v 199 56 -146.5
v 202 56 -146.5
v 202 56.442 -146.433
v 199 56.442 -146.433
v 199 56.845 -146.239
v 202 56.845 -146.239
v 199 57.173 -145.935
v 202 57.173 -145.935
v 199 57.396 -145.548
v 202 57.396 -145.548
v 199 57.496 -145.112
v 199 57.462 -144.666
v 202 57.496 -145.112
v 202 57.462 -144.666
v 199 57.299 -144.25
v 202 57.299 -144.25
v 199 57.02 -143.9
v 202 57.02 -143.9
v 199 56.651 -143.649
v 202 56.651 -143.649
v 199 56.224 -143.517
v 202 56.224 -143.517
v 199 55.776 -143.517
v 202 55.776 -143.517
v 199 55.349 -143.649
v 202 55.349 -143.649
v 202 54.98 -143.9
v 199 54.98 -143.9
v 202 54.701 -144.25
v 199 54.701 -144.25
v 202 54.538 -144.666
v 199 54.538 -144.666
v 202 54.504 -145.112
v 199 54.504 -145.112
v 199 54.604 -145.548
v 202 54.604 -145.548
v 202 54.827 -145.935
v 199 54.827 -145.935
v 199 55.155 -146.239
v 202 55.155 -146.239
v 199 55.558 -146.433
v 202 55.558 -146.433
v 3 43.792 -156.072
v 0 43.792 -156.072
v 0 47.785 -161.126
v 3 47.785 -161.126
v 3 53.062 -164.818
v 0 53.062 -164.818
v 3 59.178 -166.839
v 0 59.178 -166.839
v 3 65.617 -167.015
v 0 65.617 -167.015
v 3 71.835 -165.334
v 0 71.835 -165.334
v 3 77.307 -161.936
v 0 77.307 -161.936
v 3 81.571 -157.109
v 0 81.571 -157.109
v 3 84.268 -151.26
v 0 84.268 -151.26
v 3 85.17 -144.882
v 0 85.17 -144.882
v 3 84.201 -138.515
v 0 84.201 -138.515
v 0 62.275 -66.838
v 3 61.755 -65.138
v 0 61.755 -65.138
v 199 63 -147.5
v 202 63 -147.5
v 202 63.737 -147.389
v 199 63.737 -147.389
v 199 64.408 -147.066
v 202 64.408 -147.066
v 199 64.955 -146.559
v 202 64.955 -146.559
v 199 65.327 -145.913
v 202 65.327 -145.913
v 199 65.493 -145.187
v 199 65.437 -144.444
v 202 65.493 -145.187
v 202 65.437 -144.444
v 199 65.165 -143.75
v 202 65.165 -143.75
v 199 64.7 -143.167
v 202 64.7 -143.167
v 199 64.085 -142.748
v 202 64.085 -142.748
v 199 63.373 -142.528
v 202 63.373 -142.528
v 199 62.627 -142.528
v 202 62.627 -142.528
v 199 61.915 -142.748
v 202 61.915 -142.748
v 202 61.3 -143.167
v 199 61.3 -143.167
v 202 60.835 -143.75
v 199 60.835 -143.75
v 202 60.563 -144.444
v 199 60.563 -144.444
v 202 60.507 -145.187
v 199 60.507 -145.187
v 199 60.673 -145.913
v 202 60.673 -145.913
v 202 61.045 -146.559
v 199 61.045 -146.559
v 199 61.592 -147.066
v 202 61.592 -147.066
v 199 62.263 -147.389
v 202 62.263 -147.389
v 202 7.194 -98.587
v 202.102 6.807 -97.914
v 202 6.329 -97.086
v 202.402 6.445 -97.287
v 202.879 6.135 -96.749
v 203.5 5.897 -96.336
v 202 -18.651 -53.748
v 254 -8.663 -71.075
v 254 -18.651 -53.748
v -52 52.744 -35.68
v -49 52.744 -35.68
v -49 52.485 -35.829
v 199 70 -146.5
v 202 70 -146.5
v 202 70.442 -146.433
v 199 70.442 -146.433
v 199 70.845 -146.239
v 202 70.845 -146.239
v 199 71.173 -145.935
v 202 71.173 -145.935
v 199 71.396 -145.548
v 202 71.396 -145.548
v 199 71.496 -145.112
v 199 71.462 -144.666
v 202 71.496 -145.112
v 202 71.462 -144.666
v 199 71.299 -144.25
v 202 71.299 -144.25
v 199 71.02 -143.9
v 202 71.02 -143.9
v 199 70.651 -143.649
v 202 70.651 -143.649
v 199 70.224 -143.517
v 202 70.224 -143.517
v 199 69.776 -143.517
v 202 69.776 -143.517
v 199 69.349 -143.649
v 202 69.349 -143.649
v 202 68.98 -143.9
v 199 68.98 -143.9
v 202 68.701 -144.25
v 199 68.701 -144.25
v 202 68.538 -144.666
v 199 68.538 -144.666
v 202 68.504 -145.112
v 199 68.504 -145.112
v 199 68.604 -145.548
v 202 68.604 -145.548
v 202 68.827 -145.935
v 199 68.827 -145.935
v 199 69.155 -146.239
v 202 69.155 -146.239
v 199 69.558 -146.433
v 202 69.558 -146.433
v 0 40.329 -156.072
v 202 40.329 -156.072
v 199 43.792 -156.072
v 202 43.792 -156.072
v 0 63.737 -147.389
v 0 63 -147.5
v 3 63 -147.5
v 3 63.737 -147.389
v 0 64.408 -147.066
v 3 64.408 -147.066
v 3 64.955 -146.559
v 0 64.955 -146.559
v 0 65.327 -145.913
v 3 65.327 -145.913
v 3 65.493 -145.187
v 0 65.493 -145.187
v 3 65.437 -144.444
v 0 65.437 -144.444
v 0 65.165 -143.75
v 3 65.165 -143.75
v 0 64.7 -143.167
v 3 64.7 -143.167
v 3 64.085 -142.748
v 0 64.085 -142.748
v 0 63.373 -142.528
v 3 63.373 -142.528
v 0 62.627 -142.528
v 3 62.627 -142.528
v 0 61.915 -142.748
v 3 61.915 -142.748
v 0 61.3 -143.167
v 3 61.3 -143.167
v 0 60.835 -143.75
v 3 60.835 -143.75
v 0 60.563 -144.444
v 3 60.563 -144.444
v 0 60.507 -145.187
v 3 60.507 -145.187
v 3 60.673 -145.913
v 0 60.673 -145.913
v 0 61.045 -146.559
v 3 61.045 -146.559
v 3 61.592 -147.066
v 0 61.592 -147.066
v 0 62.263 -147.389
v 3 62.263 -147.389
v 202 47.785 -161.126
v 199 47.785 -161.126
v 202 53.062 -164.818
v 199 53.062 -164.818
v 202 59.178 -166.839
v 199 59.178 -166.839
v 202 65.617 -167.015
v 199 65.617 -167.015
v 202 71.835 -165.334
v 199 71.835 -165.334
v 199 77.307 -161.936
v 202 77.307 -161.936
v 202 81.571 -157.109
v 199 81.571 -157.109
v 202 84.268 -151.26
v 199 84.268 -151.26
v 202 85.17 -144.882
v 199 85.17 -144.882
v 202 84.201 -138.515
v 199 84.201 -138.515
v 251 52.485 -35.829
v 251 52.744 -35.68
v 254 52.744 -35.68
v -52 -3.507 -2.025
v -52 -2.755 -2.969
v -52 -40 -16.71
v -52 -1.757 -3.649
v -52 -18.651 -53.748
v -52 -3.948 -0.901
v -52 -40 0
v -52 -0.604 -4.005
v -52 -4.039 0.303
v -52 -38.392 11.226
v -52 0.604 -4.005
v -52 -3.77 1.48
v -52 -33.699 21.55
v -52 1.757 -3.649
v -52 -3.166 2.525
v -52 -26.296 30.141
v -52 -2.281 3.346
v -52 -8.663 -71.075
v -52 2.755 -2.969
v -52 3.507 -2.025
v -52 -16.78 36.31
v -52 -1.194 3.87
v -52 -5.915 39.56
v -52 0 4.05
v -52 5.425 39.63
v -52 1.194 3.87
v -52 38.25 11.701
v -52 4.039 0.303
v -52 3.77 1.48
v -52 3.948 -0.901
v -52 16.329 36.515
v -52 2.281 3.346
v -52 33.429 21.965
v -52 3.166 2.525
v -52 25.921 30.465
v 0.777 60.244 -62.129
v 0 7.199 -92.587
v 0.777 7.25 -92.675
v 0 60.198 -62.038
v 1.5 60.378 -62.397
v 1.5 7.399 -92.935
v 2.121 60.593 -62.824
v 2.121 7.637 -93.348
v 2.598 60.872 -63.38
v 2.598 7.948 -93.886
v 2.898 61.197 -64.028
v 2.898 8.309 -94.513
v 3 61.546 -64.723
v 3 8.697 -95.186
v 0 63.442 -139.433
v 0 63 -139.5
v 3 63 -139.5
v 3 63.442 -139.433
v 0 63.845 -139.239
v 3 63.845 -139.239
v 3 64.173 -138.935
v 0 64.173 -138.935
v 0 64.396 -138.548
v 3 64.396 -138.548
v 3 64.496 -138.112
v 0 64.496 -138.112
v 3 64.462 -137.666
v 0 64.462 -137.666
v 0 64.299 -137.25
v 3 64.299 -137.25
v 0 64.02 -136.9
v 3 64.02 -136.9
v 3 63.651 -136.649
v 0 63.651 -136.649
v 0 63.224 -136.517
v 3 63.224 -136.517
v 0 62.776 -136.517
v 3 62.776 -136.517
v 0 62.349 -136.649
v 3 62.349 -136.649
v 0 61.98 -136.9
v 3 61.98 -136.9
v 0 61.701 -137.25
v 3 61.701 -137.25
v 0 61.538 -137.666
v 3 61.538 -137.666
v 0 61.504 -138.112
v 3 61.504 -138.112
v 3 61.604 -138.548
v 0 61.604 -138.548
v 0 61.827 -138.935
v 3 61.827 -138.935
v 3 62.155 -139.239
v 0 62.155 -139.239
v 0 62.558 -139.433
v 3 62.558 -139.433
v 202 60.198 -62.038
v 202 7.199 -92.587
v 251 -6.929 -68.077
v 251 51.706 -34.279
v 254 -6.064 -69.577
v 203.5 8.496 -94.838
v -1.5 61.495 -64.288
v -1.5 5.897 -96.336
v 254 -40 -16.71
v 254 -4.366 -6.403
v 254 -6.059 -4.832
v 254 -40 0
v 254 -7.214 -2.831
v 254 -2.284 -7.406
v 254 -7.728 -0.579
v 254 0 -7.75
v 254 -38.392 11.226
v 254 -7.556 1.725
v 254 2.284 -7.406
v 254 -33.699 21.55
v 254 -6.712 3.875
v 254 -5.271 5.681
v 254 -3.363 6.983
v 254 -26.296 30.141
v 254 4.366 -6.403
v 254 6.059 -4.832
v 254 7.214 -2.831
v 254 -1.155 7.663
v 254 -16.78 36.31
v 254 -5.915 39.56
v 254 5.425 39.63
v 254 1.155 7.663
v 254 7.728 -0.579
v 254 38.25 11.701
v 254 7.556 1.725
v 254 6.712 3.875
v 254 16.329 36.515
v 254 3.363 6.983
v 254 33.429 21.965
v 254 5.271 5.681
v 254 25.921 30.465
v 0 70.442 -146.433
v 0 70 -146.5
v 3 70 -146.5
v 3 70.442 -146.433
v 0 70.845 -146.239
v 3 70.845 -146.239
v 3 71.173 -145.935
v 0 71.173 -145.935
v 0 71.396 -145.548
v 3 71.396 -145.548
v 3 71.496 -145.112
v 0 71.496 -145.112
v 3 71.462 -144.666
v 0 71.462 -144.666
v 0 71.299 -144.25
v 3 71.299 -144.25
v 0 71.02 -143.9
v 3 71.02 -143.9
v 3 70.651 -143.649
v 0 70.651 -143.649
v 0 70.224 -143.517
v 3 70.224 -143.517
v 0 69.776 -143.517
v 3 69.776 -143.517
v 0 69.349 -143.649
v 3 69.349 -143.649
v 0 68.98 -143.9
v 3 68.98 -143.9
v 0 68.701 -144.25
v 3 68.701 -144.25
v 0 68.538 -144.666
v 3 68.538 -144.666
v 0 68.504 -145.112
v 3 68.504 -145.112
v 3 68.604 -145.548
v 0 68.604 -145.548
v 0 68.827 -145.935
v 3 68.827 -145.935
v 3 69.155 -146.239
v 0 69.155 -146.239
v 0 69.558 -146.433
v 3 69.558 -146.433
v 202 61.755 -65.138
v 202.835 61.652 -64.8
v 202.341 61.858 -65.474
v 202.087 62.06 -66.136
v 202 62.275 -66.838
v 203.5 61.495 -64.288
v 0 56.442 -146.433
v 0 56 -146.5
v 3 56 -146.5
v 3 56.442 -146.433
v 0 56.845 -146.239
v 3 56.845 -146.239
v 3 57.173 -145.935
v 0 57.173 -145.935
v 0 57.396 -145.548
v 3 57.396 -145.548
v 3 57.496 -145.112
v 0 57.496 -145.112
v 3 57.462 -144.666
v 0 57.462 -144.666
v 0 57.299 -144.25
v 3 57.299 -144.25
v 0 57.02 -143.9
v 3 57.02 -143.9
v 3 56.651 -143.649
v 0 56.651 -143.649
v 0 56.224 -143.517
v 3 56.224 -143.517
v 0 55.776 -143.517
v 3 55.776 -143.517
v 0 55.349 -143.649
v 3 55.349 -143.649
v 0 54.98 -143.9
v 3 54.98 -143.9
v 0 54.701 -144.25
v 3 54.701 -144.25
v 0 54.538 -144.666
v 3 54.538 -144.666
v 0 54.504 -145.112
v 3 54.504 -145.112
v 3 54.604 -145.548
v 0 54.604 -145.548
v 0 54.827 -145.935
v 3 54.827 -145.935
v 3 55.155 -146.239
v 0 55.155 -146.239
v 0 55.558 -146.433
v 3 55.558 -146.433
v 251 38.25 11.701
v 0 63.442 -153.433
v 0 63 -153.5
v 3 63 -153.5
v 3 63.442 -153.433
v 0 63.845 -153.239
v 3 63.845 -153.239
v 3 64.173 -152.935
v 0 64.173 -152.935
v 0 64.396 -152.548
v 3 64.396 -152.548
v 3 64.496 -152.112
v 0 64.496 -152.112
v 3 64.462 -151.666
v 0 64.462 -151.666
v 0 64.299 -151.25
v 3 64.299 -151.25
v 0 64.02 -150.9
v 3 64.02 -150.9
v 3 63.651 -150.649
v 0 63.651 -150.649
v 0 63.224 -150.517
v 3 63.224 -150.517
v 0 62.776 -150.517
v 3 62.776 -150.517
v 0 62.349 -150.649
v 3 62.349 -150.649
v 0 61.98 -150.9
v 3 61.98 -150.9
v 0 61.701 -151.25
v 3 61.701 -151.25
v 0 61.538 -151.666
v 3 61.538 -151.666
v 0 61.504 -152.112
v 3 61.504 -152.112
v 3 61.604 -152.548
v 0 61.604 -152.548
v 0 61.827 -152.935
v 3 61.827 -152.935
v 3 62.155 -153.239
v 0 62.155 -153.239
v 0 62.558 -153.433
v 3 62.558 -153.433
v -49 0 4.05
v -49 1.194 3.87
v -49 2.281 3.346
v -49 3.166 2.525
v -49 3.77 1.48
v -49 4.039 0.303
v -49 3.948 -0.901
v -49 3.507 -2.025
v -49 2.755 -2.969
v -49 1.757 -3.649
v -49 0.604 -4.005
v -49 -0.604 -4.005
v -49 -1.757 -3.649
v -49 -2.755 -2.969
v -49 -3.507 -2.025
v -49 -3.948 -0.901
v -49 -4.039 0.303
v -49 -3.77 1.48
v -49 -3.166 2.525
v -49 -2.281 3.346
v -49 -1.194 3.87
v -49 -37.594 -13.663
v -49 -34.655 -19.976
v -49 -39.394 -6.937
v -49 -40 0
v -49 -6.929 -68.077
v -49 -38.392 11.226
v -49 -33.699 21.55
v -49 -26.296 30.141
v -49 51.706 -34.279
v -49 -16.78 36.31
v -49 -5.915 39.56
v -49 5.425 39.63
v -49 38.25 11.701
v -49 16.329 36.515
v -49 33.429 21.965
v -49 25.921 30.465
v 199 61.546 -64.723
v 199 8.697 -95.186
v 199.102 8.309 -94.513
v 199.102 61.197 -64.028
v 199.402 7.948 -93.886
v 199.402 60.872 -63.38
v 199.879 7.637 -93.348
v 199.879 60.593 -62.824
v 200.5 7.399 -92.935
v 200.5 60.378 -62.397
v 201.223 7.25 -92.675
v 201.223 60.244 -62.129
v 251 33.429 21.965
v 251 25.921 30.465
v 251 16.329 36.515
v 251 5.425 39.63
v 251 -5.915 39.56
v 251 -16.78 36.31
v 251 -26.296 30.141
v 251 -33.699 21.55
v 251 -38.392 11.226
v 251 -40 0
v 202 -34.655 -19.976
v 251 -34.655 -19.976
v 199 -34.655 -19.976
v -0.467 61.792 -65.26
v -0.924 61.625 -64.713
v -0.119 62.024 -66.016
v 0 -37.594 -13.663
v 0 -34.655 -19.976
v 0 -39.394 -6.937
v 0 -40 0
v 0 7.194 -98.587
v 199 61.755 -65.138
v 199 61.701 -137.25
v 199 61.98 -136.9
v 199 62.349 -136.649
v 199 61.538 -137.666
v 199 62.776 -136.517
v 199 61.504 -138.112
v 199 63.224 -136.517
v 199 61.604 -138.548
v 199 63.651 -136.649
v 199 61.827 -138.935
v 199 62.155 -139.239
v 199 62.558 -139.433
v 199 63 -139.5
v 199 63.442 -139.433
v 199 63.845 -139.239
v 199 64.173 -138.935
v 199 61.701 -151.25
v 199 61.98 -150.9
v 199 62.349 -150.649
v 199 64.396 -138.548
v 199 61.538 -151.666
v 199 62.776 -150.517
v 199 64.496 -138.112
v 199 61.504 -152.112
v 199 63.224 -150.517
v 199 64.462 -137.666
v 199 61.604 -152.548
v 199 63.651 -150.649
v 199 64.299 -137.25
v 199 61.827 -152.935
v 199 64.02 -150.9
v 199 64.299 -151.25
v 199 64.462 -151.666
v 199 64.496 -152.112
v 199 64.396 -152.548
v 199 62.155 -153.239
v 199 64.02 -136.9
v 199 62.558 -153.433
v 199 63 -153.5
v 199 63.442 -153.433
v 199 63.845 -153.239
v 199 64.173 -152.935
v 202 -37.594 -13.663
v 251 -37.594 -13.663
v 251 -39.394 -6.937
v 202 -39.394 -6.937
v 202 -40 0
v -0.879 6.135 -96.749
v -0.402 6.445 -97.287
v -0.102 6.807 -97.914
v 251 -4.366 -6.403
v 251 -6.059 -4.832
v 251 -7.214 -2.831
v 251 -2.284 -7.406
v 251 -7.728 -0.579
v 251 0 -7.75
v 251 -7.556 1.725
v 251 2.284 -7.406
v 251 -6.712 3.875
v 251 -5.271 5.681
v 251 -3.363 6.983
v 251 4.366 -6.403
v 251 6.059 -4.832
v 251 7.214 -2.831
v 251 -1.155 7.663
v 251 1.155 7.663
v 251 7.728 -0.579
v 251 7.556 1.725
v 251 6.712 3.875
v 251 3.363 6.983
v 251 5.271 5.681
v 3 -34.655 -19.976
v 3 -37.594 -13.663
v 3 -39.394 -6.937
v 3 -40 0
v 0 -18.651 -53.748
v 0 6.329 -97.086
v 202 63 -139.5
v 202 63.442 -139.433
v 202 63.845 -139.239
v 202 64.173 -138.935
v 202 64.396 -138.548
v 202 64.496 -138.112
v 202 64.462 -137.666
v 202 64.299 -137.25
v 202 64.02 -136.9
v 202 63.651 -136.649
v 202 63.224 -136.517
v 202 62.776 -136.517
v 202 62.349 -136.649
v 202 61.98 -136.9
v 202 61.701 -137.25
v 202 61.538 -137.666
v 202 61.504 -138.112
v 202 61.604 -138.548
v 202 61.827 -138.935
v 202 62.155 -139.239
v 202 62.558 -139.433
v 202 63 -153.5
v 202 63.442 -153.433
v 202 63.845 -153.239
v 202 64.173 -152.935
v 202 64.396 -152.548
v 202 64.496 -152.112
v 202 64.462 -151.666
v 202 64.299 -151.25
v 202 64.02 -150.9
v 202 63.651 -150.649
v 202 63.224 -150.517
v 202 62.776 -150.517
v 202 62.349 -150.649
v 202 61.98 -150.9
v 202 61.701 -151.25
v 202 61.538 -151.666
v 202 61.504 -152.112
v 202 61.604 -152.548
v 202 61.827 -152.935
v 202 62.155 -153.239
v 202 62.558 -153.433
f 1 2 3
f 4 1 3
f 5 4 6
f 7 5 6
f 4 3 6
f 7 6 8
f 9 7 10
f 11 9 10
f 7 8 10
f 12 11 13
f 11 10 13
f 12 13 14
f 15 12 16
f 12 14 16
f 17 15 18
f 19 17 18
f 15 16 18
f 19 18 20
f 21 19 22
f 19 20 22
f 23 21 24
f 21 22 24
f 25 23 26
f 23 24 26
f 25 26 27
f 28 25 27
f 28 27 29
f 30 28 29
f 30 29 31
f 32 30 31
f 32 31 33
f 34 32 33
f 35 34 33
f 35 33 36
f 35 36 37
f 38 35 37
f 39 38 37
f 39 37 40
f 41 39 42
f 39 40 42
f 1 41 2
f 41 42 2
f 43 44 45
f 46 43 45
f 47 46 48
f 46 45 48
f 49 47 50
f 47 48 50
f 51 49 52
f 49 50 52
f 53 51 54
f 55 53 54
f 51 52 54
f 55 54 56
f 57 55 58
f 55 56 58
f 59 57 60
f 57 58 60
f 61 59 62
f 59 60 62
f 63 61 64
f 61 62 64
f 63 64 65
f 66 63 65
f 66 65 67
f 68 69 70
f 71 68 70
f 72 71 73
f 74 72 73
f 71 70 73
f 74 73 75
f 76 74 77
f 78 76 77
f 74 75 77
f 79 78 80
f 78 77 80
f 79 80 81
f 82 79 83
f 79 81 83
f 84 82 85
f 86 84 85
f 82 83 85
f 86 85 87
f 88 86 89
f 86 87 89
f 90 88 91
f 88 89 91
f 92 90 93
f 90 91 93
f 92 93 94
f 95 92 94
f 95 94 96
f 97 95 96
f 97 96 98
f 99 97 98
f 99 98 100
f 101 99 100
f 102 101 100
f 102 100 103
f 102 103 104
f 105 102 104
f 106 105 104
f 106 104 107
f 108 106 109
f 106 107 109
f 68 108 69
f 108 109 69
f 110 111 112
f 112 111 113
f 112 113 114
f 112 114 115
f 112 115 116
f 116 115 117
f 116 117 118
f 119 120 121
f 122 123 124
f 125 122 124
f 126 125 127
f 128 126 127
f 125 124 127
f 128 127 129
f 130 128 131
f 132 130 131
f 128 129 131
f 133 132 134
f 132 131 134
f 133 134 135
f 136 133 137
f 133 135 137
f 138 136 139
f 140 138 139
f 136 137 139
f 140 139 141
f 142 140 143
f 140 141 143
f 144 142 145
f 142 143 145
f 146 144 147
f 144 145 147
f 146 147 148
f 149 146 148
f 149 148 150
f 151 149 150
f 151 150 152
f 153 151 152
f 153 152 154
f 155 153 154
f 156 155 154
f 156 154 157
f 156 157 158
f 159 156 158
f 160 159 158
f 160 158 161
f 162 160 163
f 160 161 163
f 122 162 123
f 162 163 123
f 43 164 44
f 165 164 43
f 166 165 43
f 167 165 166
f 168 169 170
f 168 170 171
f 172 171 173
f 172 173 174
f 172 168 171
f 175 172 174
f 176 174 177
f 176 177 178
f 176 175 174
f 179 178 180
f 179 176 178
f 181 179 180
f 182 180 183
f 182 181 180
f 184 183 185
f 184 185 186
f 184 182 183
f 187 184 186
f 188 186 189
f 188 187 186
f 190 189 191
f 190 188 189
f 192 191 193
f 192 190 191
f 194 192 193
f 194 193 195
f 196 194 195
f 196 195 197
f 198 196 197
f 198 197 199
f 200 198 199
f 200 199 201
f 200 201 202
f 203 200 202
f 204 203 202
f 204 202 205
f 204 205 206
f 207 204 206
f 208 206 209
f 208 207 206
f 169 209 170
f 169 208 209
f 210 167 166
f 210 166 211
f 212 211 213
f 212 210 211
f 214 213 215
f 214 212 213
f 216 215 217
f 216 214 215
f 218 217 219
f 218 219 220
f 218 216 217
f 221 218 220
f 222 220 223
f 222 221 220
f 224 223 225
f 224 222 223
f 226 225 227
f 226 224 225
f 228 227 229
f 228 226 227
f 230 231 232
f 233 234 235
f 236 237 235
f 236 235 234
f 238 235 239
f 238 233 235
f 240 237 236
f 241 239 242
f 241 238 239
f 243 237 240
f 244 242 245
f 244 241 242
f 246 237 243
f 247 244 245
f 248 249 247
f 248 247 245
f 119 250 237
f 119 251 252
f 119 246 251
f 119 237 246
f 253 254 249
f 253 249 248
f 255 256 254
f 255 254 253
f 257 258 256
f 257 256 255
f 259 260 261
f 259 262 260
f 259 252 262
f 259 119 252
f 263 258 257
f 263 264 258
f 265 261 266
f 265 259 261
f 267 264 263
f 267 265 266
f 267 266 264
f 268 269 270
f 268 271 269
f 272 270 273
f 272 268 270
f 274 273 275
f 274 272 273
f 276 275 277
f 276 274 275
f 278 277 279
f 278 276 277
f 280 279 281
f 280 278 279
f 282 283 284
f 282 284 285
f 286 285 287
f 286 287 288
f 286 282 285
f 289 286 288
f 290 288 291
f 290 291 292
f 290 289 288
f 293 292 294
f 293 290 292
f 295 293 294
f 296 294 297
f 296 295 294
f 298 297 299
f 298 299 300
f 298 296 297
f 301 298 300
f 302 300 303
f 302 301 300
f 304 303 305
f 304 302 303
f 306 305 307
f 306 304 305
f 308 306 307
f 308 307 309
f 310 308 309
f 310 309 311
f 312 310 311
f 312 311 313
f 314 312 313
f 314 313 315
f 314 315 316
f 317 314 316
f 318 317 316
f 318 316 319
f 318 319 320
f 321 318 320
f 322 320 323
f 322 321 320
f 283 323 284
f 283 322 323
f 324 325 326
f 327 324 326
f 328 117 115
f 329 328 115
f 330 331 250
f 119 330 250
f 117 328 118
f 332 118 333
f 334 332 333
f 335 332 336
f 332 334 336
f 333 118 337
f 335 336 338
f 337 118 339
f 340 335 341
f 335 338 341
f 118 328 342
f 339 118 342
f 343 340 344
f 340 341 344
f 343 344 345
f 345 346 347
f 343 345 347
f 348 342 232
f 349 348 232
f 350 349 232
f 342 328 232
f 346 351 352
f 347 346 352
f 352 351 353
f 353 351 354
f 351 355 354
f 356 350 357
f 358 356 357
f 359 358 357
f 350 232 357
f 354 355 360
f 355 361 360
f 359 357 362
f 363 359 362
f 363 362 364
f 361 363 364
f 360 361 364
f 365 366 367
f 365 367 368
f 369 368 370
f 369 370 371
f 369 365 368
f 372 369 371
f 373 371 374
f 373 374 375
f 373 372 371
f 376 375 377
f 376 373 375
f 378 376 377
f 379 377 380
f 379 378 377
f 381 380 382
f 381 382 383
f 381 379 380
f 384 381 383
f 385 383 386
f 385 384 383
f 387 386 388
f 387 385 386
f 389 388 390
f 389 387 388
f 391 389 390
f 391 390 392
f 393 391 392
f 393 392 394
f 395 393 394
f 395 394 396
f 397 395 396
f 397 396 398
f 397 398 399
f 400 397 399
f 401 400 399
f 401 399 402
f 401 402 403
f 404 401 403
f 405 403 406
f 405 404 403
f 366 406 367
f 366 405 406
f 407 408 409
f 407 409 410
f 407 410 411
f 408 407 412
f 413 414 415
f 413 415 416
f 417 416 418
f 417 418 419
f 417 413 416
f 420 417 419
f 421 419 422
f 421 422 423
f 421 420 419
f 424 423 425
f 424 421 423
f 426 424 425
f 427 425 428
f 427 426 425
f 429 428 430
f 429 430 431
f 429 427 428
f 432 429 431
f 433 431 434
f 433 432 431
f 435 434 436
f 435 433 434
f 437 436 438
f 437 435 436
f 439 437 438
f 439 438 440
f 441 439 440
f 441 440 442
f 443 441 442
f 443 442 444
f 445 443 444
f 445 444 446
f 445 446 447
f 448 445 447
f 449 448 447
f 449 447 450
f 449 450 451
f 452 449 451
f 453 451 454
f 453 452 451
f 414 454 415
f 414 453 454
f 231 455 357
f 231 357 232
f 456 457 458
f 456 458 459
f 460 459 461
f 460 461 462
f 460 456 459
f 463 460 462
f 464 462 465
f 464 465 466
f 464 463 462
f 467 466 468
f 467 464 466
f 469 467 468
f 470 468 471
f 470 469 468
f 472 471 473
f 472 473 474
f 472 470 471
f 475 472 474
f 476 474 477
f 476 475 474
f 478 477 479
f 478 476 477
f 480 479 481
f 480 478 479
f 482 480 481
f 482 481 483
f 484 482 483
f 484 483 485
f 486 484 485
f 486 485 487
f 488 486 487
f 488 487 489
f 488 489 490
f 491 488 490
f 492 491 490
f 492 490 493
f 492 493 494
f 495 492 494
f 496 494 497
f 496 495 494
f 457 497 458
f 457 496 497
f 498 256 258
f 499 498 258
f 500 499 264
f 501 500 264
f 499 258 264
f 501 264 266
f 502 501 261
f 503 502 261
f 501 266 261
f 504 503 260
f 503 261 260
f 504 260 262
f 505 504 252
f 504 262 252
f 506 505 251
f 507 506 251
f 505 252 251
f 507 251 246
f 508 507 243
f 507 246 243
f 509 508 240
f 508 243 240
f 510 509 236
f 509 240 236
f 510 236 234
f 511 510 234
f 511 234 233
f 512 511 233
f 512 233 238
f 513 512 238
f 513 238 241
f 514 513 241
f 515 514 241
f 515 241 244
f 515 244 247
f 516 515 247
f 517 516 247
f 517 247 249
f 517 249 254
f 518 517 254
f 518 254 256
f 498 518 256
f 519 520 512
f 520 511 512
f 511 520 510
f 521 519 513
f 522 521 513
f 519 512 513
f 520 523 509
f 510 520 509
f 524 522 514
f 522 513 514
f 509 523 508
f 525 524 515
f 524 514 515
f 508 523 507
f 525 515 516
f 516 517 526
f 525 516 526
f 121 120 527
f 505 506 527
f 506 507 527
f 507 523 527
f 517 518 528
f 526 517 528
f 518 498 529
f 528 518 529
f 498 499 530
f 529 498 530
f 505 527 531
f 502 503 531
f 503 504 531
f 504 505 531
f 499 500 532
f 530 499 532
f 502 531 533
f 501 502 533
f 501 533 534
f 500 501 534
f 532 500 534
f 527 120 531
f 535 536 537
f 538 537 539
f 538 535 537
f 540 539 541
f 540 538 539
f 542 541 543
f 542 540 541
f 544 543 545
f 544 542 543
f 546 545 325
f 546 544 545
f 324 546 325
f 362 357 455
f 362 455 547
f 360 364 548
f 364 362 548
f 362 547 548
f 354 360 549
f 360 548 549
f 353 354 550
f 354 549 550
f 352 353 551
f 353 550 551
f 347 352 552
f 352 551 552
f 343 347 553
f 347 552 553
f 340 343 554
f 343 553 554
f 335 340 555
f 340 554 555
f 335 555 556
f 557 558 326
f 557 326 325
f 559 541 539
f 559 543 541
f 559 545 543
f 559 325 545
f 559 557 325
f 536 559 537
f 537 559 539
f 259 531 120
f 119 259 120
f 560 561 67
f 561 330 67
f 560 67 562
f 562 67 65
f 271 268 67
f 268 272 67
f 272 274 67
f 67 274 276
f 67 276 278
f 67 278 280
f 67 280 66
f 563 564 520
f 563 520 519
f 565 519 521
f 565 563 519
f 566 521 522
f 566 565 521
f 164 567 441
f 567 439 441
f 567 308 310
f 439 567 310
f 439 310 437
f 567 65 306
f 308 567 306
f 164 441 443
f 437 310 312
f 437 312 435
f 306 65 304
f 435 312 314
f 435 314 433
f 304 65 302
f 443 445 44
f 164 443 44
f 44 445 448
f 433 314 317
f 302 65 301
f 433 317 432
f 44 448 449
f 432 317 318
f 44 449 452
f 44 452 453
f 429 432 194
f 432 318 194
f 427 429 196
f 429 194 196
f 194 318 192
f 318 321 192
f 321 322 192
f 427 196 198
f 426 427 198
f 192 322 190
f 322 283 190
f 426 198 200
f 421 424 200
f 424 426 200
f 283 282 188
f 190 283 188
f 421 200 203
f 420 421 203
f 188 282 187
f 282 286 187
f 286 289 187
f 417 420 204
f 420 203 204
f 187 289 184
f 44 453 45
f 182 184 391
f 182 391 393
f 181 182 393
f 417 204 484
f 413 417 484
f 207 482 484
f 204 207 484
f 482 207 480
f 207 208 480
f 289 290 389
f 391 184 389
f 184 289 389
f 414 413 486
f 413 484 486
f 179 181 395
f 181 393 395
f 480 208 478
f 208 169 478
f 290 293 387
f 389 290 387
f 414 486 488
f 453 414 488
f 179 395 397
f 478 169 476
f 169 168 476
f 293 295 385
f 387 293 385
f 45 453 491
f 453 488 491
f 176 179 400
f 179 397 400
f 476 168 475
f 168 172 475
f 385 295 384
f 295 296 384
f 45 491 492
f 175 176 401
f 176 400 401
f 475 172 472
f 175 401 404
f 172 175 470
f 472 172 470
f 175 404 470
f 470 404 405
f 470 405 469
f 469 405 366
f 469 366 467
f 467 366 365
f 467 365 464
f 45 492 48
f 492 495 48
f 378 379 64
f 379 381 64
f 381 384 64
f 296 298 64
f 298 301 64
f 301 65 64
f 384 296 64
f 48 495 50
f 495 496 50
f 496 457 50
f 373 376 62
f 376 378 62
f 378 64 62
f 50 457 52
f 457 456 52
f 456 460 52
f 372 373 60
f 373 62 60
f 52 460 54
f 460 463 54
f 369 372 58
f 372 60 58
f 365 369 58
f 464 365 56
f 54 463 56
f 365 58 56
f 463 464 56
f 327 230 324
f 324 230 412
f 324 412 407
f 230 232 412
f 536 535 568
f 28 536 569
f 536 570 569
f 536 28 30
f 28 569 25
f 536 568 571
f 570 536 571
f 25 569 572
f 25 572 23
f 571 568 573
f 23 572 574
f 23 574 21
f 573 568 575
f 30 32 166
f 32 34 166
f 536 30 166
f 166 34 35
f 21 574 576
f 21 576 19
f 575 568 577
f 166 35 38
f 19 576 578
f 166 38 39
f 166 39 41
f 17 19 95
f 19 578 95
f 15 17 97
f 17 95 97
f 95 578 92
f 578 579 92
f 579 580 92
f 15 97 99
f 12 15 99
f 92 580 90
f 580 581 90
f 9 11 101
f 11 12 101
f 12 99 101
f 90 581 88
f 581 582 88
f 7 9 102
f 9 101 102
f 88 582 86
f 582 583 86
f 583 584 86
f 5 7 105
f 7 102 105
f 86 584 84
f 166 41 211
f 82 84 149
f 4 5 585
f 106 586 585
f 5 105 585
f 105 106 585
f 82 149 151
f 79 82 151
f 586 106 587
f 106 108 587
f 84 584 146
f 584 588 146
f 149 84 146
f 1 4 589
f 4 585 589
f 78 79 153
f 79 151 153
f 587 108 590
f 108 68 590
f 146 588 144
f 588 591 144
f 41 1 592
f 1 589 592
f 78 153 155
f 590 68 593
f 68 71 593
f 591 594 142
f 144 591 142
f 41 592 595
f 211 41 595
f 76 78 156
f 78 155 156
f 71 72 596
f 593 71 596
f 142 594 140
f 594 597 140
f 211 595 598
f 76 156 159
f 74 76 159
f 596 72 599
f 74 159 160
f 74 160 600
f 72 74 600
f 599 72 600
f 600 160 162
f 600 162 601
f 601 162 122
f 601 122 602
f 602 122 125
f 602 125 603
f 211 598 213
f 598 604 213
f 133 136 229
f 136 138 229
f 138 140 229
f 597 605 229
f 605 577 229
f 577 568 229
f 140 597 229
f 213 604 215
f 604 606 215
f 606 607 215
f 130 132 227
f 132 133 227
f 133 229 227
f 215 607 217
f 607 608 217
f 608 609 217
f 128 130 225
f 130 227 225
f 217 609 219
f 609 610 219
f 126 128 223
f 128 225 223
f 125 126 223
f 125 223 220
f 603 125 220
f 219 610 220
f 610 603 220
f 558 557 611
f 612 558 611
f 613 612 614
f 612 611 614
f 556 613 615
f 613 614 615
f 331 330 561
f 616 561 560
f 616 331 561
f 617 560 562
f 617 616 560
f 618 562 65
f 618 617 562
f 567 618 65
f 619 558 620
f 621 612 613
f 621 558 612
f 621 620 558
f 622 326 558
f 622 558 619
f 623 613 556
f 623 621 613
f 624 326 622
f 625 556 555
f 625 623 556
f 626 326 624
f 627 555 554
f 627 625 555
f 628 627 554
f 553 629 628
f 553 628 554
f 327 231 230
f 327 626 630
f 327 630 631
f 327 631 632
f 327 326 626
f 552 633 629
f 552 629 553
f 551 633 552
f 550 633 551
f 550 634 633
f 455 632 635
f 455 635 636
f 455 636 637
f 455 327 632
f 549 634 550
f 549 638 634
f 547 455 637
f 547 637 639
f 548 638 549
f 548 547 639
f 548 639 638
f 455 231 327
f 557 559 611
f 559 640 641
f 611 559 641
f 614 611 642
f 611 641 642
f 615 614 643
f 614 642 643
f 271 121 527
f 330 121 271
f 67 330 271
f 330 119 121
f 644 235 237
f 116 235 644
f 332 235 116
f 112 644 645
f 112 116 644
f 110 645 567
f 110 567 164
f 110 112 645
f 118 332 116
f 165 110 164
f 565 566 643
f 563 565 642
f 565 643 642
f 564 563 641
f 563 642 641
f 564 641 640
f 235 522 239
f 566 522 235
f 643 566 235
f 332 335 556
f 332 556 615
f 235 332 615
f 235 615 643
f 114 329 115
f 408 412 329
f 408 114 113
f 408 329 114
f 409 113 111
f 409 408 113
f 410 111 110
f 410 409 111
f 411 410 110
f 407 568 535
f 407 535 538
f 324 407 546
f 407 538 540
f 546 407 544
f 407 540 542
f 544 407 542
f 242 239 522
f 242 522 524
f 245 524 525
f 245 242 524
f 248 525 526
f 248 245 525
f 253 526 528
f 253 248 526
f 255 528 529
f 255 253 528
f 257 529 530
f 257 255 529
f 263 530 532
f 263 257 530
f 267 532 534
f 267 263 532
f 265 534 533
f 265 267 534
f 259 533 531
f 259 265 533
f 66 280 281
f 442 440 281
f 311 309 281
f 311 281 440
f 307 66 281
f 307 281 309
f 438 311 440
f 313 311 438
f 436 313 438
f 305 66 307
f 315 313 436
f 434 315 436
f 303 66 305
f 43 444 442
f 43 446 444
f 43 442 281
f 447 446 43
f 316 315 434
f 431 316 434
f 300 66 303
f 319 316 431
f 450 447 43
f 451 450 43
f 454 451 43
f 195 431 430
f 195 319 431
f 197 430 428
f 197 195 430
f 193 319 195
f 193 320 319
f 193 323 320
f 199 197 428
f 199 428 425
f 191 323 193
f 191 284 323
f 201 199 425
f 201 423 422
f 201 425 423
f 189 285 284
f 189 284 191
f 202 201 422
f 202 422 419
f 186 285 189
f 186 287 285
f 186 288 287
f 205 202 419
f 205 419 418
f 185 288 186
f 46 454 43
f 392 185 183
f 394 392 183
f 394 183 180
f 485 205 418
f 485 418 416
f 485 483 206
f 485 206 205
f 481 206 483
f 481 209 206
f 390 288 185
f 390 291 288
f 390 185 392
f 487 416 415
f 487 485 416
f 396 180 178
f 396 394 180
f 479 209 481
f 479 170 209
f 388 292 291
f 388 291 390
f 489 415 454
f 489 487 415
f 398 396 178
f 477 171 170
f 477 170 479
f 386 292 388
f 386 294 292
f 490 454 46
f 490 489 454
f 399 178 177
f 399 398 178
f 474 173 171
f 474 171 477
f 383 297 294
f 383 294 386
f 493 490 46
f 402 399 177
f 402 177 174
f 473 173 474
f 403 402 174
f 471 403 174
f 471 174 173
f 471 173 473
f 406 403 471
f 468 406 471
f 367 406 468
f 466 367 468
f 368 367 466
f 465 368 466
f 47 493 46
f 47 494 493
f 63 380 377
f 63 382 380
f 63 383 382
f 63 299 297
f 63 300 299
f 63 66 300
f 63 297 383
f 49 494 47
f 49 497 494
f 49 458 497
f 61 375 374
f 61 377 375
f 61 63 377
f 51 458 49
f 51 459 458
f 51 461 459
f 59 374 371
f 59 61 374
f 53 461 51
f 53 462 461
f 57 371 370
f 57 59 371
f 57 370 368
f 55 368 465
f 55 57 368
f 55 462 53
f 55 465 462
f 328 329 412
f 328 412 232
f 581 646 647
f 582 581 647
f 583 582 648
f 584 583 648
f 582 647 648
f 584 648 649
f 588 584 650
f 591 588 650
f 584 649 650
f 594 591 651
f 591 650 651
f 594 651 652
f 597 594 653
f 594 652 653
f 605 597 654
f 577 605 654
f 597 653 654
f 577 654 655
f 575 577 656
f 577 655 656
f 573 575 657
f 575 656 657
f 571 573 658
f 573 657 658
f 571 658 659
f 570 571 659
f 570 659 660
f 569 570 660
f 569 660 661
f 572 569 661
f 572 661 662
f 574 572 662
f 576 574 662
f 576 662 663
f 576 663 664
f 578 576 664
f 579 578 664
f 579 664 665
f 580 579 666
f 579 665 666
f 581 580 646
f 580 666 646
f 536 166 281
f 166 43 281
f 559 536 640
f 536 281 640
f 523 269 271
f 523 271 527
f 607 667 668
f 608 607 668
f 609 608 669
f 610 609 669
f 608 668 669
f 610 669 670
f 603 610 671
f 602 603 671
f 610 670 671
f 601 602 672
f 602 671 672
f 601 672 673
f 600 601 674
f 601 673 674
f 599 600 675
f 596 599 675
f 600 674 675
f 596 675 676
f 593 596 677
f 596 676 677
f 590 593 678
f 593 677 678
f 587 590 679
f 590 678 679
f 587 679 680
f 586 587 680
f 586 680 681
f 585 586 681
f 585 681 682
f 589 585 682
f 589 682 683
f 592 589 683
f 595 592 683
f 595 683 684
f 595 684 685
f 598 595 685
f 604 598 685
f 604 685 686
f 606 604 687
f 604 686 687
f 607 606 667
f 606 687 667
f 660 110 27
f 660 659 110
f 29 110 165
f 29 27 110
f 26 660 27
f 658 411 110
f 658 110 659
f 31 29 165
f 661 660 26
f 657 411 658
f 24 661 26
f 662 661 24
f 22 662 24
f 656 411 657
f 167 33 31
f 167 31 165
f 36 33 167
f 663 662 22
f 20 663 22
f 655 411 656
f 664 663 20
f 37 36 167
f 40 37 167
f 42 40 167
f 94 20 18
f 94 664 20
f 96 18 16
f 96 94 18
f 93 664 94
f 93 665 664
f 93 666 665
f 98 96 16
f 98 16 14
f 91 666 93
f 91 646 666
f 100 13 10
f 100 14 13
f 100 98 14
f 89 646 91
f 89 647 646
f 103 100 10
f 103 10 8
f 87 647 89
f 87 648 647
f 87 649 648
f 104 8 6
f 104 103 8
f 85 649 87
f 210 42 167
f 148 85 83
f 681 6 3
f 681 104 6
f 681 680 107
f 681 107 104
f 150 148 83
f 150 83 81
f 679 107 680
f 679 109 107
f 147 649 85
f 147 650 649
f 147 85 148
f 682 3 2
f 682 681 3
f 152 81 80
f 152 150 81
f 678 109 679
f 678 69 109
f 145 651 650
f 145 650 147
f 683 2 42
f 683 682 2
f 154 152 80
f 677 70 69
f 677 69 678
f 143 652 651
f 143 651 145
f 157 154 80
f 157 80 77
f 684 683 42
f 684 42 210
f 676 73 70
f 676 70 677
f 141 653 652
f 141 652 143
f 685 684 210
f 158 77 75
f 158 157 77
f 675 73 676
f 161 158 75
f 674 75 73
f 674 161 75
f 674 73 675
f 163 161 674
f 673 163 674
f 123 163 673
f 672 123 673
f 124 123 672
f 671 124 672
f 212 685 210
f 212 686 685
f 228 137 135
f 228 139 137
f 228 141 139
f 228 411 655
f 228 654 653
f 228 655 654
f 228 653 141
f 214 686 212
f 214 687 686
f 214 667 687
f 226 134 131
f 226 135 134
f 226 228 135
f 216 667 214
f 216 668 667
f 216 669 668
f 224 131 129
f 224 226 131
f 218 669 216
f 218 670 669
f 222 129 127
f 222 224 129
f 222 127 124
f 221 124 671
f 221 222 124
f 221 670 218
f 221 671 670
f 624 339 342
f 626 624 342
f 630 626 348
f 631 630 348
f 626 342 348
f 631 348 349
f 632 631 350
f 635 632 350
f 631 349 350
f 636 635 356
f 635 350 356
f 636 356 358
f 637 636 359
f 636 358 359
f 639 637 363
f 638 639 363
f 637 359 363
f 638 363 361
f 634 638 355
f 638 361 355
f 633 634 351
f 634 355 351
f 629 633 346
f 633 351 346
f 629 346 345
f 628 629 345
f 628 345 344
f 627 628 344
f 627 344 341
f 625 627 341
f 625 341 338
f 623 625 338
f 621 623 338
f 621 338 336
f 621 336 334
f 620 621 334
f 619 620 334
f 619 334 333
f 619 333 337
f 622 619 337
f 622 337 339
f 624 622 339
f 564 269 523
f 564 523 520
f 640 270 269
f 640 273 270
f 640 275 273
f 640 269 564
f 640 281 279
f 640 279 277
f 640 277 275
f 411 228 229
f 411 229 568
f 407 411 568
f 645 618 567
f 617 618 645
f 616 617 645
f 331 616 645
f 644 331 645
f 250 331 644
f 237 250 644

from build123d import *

# Parameters (mm, degrees)
SKETCH_2_R          = 3
SKETCH_2_R_2        = 1.5
SKETCH_2_R_3        = 2.5
EXTRUDE_1_DEPTH     = 3
EXTRUDE_2_DEPTH     = 196
SKETCH_5_R          = 8
CUT_EXTRUDE_1_DEPTH = 10
SKETCH_6_R          = 4.05
CUT_EXTRUDE_2_DEPTH = 10
SKETCH_8_R          = 40
EXTRUDE_3_DEPTH     = 3
EXTRUDE_START       = -61
EXTRUDE_4_DEPTH     = 64
EXTRUDE_5_DEPTH     = 3
EXTRUDE_START_2     = -3
EXTRUDE_14_DEPTH    = 3
EXTRUDE_15_DEPTH    = 3
SKETCH_16_R         = 40
EXTRUDE_16_DEPTH    = 3
CUT_EXTRUDE_START   = -20
CUT_EXTRUDE_5_DEPTH = 20
CUT_EXTRUDE_6_DEPTH = 20
CUT_EXTRUDE_7_DEPTH = 3
FILLET_3_R          = 3
FILLET_4_R          = 3
FILLET_5_R          = 3
FILLET_6_R          = 3
SKETCH_22_R         = 7.75
CUT_EXTRUDE_8_DEPTH = 10
SKETCH_23_R         = 4.05
CUT_EXTRUDE_9_DEPTH = 10


# Some blends are built 0.0001 mm under size
with BuildPart() as part:
    # 草图2 → 凸台-拉伸1 (new body)
    with BuildSketch(Plane(origin=(0, 0, 0), x_dir=(0, 0, -1), z_dir=(1, 0, 0))):
        with BuildLine():
            Line((138.514809283, 84.200667909), (-11.70063651, 38.25042621))
            ThreePointArc((-11.70063651, 38.25042621), (-39.560188627, -5.915359313), (0, -40))
            Line((0, -40), (16.710190716, -40))
            Line((16.710190716, -40), (156.071648789, 40.329376559))
            Line((156.071648789, 40.329376559), (156.071648789, 43.792069046))
            ThreePointArc((156.071648789, 43.792069046), (165.334026038, 71.834783727), (138.514809283, 84.200667909))
        make_face()
        Circle(SKETCH_2_R, mode=Mode.SUBTRACT)
        with Locations((145, 70)):
            Circle(SKETCH_2_R_2, mode=Mode.SUBTRACT)
        with Locations((138, 63)):
            Circle(SKETCH_2_R_2, mode=Mode.SUBTRACT)
        with Locations((145, 56)):
            Circle(SKETCH_2_R_2, mode=Mode.SUBTRACT)
        with Locations((145, 63)):
            Circle(SKETCH_2_R_3, mode=Mode.SUBTRACT)
        with Locations((152, 63)):
            Circle(SKETCH_2_R_2, mode=Mode.SUBTRACT)
    extrude_1 = extrude(amount=EXTRUDE_1_DEPTH)

    # 草图4 → 凸台-拉伸2 (add)
    with BuildSketch(Plane(origin=(3, 0, 0), x_dir=(0, 0, -1), z_dir=(1, 0, 0))):
        with BuildLine():
            Line((0, -40), (16.710190716, -40))
            Line((16.710190716, -40), (156.071648789, 40.329376559))
            Line((156.071648789, 40.329376559), (156.071648789, 43.792069046))
            Line((156.071648789, 43.792069046), (19.975563357, -34.655113166))
            ThreePointArc((19.975563357, -34.655113166), (10.339136167, -38.640681455), (0, -40))
        make_face()
    extrude(amount=EXTRUDE_2_DEPTH)

    # 镜向2: 凸台-拉伸1 across plane
    add(extrude_1.mirror(Plane(origin=(101, 0, 0), x_dir=(0, 0, 1), z_dir=(1, 0, 0))))

    # 草图5 → 切除-拉伸1 (cut)
    with BuildSketch(Plane(origin=(202, 0, 0), x_dir=(0, 0, -1), z_dir=(1, 0, 0))):
        Circle(SKETCH_5_R)
    extrude(amount=-CUT_EXTRUDE_1_DEPTH, mode=Mode.SUBTRACT)

    # 草图6 → 切除-拉伸2 (cut)
    with BuildSketch(Plane.ZY):
        Circle(SKETCH_6_R)
    extrude(amount=-CUT_EXTRUDE_2_DEPTH, mode=Mode.SUBTRACT)

    # 草图9 → 凸台-拉伸4 (add)
    with BuildSketch(Plane(origin=(251, 0, 0), x_dir=(0, 0, -1), z_dir=(1, 0, 0)).offset(EXTRUDE_START)):
        with BuildLine():
            Line((0, -40), (16.710190716, -40))
            Line((16.710190716, -40), (53.747942483, -18.651059269))
            Line((53.747942483, -18.651059269), (52.249775231, -16.051925781))
            Line((52.249775231, -16.051925781), (19.975563357, -34.655113166))
            ThreePointArc((19.975563357, -34.655113166), (10.339136167, -38.640681455), (0, -40))
        make_face()
    extrude_4 = extrude(amount=EXTRUDE_4_DEPTH)

    # 草图10 → 凸台-拉伸5 (add)
    with BuildSketch(Plane(origin=(0, -37.254246654, -21.473730609), x_dir=(1, 0, 0), z_dir=(0, -0.8663778291595938, -0.49938908392225567))):
        Polygon((254, -37.251890328), (254, -57.251890328), (202, -87.274104325), (202, -37.251890328), align=None)
    extrude_5 = extrude(amount=-EXTRUDE_5_DEPTH)



with BuildPart() as body_2:
    # 草图8 → 凸台-拉伸3 (new body)
    with BuildSketch(Plane(origin=(251, 0, 0), x_dir=(0, 0, -1), z_dir=(1, 0, 0))):
        Circle(SKETCH_8_R)
    extrude(amount=EXTRUDE_3_DEPTH)


with BuildPart() as part_1:
    add(part.part)

    add(body_2.part)  # 凸台-拉伸14 merges body 2
    # 草图14 → 凸台-拉伸14 (add)
    with BuildSketch(Plane(origin=(254, 0, 0), x_dir=(0, 0, -1), z_dir=(1, 0, 0)).offset(EXTRUDE_START_2)):
        with BuildLine():
            Line((-11.70063651, 38.25042621), (35.679778873, 52.743886101))
            Line((35.679778873, 52.743886101), (69.577331814, -6.064144103))
            Line((69.577331814, -6.064144103), (19.975563357, -34.655113166))
            ThreePointArc((19.975563357, -34.655113166), (36.686823541, 15.939792297), (-11.70063651, 38.25042621))
        make_face()
    extrude_14 = extrude(amount=EXTRUDE_14_DEPTH)

    # 草图15 → 凸台-拉伸15 (add)
    with BuildSketch(Plane(origin=(88.290795719, 76.368648195, -132.490087928), x_dir=(-0.8660254037844362, 0.24969454196113003, -0.4331889145798008), z_dir=(0.5000000000000044, 0.4324836330493111, -0.7503052093278204))):
        Polygon((-191.344507397, -43), (-191.344507397, 27.878041456), (-131.300079402, 20.97393325), (-131.300079402, -43), align=None)
    extrude_15 = extrude(amount=-EXTRUDE_15_DEPTH)

    # 镜向8: 凸台-拉伸15 across plane
    add(extrude_15.mirror(Plane(origin=(101, 0, 0), x_dir=(0, 0, 1), z_dir=(1, 0, 0))))

    # 镜向10: 凸台-拉伸5 across plane
    add(extrude_5.mirror(Plane(origin=(101, 0, 0), x_dir=(0, 0, 1), z_dir=(1, 0, 0))))

    # 镜向11: 凸台-拉伸4 across plane
    add(extrude_4.mirror(Plane(origin=(101, 0, 0), x_dir=(0, 0, 1), z_dir=(1, 0, 0))))

    # 镜向12: 凸台-拉伸14 across plane
    add(extrude_14.mirror(Plane(origin=(101, 0, 0), x_dir=(0, 0, 1), z_dir=(1, 0, 0))))

    # 草图16 → 凸台-拉伸16 (add)
    with BuildSketch(Plane.ZY.offset(52)):
        Circle(SKETCH_16_R)
    extrude(amount=-EXTRUDE_16_DEPTH)

    # 草图17 → 切除-拉伸5 (cut)
    with BuildSketch(Plane(origin=(202, 0, 0), x_dir=(0, 0, -1), z_dir=(1, 0, 0)).offset(CUT_EXTRUDE_START)):
        with BuildLine():
            Line((-11.120326036, 38.423148607), (61.739147636, 60.715331959))
            Line((61.739147636, 60.715331959), (65.138195736, 61.755085767))
            Line((65.138195736, 61.755085767), (62.037518083, 60.197696416))
            Line((62.037518083, 60.197696416), (92.586691567, 7.198687311))
            Line((92.586691567, 7.198687311), (19.975563357, -34.655113166))
            ThreePointArc((19.975563357, -34.655113166), (-36.806411031, -15.66167638), (-11.120326036, 38.423148607))
        make_face()
    extrude(amount=CUT_EXTRUDE_5_DEPTH, mode=Mode.SUBTRACT)


with BuildPart() as cut_extrude_5_piece_1:
    # of the separate pieces the step leaves, piece 1, a body of its own (cut_extrude_5_pieces)
    add(part_1.part.solids().sort_by_distance((0, 43.792069046, -156.071648789))[0])

    # 草图21 → 切除-拉伸7 (cut)
    with BuildSketch(Plane(origin=(3, 0, 0), x_dir=(0, 0, -1), z_dir=(1, 0, 0))):
        with BuildLine():
            Line((92.586691567, 7.198687311), (62.037518083, 60.197696416))
            Line((62.037518083, 60.197696416), (65.138195736, 61.755085767))
            Line((65.138195736, 61.755085767), (61.739147636, 60.715331959))
            Line((61.739147636, 60.715331959), (-11.70063651, 38.25042621))
            ThreePointArc((-11.70063651, 38.25042621), (-36.686823541, -15.939792297), (19.975563357, -34.655113166))
            Line((19.975563357, -34.655113166), (92.586691567, 7.198687311))
        make_face()
    extrude(amount=-CUT_EXTRUDE_7_DEPTH, mode=Mode.SUBTRACT)

    # 圆角3
    fillet_3_edges = [cut_extrude_5_piece_1.edges().sort_by_distance(p)[0] for p in [
        (3, 33.698191863, -77.312104825),
    ]]
    fillet(fillet_3_edges, radius=FILLET_3_R - 0.0001)  # a hair under: the kernel refuses the full size

    # 圆角4
    fillet_4_edges = [cut_extrude_5_piece_1.edges().sort_by_distance(p)[0] for p in [
        (199, 33.698191863, -77.312104825),
    ]]
    fillet(fillet_4_edges, radius=FILLET_4_R - 0.0001)  # a hair under: the kernel refuses the full size

    # 圆角5
    # the kernel refuses this fillet: 3 mm, written as the material it adds along each edge
    with BuildSketch(Plane(origin=(202, 65.506611814, -62.97577757), x_dir=(0, 0.49938908392225534, -0.8663778291595939), z_dir=(0, -0.866377829159594, -0.4993890839222554))) as fillet_5_piece_1_section:
        with BuildLine():
            CenterArc((FILLET_5_R * 0.57735026919, FILLET_5_R), FILLET_5_R, 210, 60)
            Line((-FILLET_5_R * 0.288675134595, FILLET_5_R * 0.5), (0, 0))
            Line((0, 0), (FILLET_5_R * 0.57735026919, 0))
        make_face()
    fillet_5_piece_1 = extrude(amount=68.304060269, mode=Mode.PRIVATE)
    fillet_5_piece_1 = split(fillet_5_piece_1, bisect_by=Plane(origin=(202.325553984, 63.906694987, -72.171998522), z_dir=(0, -0.9562606552534866, -0.2925159127537726)), keep=Keep.TOP, mode=Mode.PRIVATE)
    fillet_5_piece_1 = split(fillet_5_piece_1, bisect_by=Plane(origin=(199.177617764, 62.412552566, -67.072312804), z_dir=(0.09892666816624712, -0.8892295154916122, -0.44663674625368427)), keep=Keep.TOP, mode=Mode.PRIVATE)
    add(fillet_5_piece_1)

    # 圆角6
    # the kernel refuses this fillet: 3 mm, written as the material it adds along each edge
    with BuildSketch(Plane(origin=(0, 6.329488355, -97.086079656), x_dir=(2.017234182721707e-14, 0.49938908392225534, -0.8663778291595939), z_dir=(0, 0.8663778291595939, 0.4993890839222554))) as fillet_6_piece_1_section:
        with BuildLine():
            CenterArc((FILLET_6_R * 0.57735026919, FILLET_6_R), FILLET_6_R, 210, 60)
            Line((-FILLET_6_R * 0.288675134595, FILLET_6_R * 0.5), (0, 0))
            Line((0, 0), (FILLET_6_R * 0.57735026919, 0))
        make_face()
    fillet_6_piece_1 = extrude(amount=68.304060269, mode=Mode.PRIVATE)
    fillet_6_piece_1 = split(fillet_6_piece_1, bisect_by=Plane(origin=(-0.325553984, 63.906694987, -72.171998522), z_dir=(0, -0.9562606552534866, -0.2925159127537726)), keep=Keep.TOP, mode=Mode.PRIVATE)
    fillet_6_piece_1 = split(fillet_6_piece_1, bisect_by=Plane(origin=(2.822382236, 62.412552566, -67.072312804), z_dir=(-0.09892666816624712, -0.8892295154916122, -0.44663674625368427)), keep=Keep.TOP, mode=Mode.PRIVATE)
    add(fillet_6_piece_1)

    # 草图22 → 切除-拉伸8 (cut)
    with BuildSketch(Plane(origin=(254, 0, 0), x_dir=(0, 0, -1), z_dir=(1, 0, 0))):
        Circle(SKETCH_22_R)
    extrude(amount=-CUT_EXTRUDE_8_DEPTH, mode=Mode.SUBTRACT)

    # 草图23 → 切除-拉伸9 (cut)
    with BuildSketch(Plane.ZY.offset(52)):
        Circle(SKETCH_23_R)
    extrude(amount=-CUT_EXTRUDE_9_DEPTH, mode=Mode.SUBTRACT)


with BuildPart() as cut_extrude_5_piece_2:
    # of the separate pieces the step leaves, piece 2, a body of its own (cut_extrude_5_pieces)
    add(part_1.part.solids().sort_by_distance((202, 60.715331959, -61.739147636))[0])

    # 草图18 → 切除-拉伸6 (cut)
    with BuildSketch(Plane(origin=(0, 38.25042621, 11.70063651), x_dir=(1, 0, 0), z_dir=(0, 0.9562606552534866, 0.2925159127537726))):
        Polygon((199, 76.798918519), (202, 76.932821805), (202, 0), (199, 0), align=None)
    extrude(amount=-CUT_EXTRUDE_6_DEPTH, mode=Mode.SUBTRACT)


solid = cut_extrude_5_piece_1.part
